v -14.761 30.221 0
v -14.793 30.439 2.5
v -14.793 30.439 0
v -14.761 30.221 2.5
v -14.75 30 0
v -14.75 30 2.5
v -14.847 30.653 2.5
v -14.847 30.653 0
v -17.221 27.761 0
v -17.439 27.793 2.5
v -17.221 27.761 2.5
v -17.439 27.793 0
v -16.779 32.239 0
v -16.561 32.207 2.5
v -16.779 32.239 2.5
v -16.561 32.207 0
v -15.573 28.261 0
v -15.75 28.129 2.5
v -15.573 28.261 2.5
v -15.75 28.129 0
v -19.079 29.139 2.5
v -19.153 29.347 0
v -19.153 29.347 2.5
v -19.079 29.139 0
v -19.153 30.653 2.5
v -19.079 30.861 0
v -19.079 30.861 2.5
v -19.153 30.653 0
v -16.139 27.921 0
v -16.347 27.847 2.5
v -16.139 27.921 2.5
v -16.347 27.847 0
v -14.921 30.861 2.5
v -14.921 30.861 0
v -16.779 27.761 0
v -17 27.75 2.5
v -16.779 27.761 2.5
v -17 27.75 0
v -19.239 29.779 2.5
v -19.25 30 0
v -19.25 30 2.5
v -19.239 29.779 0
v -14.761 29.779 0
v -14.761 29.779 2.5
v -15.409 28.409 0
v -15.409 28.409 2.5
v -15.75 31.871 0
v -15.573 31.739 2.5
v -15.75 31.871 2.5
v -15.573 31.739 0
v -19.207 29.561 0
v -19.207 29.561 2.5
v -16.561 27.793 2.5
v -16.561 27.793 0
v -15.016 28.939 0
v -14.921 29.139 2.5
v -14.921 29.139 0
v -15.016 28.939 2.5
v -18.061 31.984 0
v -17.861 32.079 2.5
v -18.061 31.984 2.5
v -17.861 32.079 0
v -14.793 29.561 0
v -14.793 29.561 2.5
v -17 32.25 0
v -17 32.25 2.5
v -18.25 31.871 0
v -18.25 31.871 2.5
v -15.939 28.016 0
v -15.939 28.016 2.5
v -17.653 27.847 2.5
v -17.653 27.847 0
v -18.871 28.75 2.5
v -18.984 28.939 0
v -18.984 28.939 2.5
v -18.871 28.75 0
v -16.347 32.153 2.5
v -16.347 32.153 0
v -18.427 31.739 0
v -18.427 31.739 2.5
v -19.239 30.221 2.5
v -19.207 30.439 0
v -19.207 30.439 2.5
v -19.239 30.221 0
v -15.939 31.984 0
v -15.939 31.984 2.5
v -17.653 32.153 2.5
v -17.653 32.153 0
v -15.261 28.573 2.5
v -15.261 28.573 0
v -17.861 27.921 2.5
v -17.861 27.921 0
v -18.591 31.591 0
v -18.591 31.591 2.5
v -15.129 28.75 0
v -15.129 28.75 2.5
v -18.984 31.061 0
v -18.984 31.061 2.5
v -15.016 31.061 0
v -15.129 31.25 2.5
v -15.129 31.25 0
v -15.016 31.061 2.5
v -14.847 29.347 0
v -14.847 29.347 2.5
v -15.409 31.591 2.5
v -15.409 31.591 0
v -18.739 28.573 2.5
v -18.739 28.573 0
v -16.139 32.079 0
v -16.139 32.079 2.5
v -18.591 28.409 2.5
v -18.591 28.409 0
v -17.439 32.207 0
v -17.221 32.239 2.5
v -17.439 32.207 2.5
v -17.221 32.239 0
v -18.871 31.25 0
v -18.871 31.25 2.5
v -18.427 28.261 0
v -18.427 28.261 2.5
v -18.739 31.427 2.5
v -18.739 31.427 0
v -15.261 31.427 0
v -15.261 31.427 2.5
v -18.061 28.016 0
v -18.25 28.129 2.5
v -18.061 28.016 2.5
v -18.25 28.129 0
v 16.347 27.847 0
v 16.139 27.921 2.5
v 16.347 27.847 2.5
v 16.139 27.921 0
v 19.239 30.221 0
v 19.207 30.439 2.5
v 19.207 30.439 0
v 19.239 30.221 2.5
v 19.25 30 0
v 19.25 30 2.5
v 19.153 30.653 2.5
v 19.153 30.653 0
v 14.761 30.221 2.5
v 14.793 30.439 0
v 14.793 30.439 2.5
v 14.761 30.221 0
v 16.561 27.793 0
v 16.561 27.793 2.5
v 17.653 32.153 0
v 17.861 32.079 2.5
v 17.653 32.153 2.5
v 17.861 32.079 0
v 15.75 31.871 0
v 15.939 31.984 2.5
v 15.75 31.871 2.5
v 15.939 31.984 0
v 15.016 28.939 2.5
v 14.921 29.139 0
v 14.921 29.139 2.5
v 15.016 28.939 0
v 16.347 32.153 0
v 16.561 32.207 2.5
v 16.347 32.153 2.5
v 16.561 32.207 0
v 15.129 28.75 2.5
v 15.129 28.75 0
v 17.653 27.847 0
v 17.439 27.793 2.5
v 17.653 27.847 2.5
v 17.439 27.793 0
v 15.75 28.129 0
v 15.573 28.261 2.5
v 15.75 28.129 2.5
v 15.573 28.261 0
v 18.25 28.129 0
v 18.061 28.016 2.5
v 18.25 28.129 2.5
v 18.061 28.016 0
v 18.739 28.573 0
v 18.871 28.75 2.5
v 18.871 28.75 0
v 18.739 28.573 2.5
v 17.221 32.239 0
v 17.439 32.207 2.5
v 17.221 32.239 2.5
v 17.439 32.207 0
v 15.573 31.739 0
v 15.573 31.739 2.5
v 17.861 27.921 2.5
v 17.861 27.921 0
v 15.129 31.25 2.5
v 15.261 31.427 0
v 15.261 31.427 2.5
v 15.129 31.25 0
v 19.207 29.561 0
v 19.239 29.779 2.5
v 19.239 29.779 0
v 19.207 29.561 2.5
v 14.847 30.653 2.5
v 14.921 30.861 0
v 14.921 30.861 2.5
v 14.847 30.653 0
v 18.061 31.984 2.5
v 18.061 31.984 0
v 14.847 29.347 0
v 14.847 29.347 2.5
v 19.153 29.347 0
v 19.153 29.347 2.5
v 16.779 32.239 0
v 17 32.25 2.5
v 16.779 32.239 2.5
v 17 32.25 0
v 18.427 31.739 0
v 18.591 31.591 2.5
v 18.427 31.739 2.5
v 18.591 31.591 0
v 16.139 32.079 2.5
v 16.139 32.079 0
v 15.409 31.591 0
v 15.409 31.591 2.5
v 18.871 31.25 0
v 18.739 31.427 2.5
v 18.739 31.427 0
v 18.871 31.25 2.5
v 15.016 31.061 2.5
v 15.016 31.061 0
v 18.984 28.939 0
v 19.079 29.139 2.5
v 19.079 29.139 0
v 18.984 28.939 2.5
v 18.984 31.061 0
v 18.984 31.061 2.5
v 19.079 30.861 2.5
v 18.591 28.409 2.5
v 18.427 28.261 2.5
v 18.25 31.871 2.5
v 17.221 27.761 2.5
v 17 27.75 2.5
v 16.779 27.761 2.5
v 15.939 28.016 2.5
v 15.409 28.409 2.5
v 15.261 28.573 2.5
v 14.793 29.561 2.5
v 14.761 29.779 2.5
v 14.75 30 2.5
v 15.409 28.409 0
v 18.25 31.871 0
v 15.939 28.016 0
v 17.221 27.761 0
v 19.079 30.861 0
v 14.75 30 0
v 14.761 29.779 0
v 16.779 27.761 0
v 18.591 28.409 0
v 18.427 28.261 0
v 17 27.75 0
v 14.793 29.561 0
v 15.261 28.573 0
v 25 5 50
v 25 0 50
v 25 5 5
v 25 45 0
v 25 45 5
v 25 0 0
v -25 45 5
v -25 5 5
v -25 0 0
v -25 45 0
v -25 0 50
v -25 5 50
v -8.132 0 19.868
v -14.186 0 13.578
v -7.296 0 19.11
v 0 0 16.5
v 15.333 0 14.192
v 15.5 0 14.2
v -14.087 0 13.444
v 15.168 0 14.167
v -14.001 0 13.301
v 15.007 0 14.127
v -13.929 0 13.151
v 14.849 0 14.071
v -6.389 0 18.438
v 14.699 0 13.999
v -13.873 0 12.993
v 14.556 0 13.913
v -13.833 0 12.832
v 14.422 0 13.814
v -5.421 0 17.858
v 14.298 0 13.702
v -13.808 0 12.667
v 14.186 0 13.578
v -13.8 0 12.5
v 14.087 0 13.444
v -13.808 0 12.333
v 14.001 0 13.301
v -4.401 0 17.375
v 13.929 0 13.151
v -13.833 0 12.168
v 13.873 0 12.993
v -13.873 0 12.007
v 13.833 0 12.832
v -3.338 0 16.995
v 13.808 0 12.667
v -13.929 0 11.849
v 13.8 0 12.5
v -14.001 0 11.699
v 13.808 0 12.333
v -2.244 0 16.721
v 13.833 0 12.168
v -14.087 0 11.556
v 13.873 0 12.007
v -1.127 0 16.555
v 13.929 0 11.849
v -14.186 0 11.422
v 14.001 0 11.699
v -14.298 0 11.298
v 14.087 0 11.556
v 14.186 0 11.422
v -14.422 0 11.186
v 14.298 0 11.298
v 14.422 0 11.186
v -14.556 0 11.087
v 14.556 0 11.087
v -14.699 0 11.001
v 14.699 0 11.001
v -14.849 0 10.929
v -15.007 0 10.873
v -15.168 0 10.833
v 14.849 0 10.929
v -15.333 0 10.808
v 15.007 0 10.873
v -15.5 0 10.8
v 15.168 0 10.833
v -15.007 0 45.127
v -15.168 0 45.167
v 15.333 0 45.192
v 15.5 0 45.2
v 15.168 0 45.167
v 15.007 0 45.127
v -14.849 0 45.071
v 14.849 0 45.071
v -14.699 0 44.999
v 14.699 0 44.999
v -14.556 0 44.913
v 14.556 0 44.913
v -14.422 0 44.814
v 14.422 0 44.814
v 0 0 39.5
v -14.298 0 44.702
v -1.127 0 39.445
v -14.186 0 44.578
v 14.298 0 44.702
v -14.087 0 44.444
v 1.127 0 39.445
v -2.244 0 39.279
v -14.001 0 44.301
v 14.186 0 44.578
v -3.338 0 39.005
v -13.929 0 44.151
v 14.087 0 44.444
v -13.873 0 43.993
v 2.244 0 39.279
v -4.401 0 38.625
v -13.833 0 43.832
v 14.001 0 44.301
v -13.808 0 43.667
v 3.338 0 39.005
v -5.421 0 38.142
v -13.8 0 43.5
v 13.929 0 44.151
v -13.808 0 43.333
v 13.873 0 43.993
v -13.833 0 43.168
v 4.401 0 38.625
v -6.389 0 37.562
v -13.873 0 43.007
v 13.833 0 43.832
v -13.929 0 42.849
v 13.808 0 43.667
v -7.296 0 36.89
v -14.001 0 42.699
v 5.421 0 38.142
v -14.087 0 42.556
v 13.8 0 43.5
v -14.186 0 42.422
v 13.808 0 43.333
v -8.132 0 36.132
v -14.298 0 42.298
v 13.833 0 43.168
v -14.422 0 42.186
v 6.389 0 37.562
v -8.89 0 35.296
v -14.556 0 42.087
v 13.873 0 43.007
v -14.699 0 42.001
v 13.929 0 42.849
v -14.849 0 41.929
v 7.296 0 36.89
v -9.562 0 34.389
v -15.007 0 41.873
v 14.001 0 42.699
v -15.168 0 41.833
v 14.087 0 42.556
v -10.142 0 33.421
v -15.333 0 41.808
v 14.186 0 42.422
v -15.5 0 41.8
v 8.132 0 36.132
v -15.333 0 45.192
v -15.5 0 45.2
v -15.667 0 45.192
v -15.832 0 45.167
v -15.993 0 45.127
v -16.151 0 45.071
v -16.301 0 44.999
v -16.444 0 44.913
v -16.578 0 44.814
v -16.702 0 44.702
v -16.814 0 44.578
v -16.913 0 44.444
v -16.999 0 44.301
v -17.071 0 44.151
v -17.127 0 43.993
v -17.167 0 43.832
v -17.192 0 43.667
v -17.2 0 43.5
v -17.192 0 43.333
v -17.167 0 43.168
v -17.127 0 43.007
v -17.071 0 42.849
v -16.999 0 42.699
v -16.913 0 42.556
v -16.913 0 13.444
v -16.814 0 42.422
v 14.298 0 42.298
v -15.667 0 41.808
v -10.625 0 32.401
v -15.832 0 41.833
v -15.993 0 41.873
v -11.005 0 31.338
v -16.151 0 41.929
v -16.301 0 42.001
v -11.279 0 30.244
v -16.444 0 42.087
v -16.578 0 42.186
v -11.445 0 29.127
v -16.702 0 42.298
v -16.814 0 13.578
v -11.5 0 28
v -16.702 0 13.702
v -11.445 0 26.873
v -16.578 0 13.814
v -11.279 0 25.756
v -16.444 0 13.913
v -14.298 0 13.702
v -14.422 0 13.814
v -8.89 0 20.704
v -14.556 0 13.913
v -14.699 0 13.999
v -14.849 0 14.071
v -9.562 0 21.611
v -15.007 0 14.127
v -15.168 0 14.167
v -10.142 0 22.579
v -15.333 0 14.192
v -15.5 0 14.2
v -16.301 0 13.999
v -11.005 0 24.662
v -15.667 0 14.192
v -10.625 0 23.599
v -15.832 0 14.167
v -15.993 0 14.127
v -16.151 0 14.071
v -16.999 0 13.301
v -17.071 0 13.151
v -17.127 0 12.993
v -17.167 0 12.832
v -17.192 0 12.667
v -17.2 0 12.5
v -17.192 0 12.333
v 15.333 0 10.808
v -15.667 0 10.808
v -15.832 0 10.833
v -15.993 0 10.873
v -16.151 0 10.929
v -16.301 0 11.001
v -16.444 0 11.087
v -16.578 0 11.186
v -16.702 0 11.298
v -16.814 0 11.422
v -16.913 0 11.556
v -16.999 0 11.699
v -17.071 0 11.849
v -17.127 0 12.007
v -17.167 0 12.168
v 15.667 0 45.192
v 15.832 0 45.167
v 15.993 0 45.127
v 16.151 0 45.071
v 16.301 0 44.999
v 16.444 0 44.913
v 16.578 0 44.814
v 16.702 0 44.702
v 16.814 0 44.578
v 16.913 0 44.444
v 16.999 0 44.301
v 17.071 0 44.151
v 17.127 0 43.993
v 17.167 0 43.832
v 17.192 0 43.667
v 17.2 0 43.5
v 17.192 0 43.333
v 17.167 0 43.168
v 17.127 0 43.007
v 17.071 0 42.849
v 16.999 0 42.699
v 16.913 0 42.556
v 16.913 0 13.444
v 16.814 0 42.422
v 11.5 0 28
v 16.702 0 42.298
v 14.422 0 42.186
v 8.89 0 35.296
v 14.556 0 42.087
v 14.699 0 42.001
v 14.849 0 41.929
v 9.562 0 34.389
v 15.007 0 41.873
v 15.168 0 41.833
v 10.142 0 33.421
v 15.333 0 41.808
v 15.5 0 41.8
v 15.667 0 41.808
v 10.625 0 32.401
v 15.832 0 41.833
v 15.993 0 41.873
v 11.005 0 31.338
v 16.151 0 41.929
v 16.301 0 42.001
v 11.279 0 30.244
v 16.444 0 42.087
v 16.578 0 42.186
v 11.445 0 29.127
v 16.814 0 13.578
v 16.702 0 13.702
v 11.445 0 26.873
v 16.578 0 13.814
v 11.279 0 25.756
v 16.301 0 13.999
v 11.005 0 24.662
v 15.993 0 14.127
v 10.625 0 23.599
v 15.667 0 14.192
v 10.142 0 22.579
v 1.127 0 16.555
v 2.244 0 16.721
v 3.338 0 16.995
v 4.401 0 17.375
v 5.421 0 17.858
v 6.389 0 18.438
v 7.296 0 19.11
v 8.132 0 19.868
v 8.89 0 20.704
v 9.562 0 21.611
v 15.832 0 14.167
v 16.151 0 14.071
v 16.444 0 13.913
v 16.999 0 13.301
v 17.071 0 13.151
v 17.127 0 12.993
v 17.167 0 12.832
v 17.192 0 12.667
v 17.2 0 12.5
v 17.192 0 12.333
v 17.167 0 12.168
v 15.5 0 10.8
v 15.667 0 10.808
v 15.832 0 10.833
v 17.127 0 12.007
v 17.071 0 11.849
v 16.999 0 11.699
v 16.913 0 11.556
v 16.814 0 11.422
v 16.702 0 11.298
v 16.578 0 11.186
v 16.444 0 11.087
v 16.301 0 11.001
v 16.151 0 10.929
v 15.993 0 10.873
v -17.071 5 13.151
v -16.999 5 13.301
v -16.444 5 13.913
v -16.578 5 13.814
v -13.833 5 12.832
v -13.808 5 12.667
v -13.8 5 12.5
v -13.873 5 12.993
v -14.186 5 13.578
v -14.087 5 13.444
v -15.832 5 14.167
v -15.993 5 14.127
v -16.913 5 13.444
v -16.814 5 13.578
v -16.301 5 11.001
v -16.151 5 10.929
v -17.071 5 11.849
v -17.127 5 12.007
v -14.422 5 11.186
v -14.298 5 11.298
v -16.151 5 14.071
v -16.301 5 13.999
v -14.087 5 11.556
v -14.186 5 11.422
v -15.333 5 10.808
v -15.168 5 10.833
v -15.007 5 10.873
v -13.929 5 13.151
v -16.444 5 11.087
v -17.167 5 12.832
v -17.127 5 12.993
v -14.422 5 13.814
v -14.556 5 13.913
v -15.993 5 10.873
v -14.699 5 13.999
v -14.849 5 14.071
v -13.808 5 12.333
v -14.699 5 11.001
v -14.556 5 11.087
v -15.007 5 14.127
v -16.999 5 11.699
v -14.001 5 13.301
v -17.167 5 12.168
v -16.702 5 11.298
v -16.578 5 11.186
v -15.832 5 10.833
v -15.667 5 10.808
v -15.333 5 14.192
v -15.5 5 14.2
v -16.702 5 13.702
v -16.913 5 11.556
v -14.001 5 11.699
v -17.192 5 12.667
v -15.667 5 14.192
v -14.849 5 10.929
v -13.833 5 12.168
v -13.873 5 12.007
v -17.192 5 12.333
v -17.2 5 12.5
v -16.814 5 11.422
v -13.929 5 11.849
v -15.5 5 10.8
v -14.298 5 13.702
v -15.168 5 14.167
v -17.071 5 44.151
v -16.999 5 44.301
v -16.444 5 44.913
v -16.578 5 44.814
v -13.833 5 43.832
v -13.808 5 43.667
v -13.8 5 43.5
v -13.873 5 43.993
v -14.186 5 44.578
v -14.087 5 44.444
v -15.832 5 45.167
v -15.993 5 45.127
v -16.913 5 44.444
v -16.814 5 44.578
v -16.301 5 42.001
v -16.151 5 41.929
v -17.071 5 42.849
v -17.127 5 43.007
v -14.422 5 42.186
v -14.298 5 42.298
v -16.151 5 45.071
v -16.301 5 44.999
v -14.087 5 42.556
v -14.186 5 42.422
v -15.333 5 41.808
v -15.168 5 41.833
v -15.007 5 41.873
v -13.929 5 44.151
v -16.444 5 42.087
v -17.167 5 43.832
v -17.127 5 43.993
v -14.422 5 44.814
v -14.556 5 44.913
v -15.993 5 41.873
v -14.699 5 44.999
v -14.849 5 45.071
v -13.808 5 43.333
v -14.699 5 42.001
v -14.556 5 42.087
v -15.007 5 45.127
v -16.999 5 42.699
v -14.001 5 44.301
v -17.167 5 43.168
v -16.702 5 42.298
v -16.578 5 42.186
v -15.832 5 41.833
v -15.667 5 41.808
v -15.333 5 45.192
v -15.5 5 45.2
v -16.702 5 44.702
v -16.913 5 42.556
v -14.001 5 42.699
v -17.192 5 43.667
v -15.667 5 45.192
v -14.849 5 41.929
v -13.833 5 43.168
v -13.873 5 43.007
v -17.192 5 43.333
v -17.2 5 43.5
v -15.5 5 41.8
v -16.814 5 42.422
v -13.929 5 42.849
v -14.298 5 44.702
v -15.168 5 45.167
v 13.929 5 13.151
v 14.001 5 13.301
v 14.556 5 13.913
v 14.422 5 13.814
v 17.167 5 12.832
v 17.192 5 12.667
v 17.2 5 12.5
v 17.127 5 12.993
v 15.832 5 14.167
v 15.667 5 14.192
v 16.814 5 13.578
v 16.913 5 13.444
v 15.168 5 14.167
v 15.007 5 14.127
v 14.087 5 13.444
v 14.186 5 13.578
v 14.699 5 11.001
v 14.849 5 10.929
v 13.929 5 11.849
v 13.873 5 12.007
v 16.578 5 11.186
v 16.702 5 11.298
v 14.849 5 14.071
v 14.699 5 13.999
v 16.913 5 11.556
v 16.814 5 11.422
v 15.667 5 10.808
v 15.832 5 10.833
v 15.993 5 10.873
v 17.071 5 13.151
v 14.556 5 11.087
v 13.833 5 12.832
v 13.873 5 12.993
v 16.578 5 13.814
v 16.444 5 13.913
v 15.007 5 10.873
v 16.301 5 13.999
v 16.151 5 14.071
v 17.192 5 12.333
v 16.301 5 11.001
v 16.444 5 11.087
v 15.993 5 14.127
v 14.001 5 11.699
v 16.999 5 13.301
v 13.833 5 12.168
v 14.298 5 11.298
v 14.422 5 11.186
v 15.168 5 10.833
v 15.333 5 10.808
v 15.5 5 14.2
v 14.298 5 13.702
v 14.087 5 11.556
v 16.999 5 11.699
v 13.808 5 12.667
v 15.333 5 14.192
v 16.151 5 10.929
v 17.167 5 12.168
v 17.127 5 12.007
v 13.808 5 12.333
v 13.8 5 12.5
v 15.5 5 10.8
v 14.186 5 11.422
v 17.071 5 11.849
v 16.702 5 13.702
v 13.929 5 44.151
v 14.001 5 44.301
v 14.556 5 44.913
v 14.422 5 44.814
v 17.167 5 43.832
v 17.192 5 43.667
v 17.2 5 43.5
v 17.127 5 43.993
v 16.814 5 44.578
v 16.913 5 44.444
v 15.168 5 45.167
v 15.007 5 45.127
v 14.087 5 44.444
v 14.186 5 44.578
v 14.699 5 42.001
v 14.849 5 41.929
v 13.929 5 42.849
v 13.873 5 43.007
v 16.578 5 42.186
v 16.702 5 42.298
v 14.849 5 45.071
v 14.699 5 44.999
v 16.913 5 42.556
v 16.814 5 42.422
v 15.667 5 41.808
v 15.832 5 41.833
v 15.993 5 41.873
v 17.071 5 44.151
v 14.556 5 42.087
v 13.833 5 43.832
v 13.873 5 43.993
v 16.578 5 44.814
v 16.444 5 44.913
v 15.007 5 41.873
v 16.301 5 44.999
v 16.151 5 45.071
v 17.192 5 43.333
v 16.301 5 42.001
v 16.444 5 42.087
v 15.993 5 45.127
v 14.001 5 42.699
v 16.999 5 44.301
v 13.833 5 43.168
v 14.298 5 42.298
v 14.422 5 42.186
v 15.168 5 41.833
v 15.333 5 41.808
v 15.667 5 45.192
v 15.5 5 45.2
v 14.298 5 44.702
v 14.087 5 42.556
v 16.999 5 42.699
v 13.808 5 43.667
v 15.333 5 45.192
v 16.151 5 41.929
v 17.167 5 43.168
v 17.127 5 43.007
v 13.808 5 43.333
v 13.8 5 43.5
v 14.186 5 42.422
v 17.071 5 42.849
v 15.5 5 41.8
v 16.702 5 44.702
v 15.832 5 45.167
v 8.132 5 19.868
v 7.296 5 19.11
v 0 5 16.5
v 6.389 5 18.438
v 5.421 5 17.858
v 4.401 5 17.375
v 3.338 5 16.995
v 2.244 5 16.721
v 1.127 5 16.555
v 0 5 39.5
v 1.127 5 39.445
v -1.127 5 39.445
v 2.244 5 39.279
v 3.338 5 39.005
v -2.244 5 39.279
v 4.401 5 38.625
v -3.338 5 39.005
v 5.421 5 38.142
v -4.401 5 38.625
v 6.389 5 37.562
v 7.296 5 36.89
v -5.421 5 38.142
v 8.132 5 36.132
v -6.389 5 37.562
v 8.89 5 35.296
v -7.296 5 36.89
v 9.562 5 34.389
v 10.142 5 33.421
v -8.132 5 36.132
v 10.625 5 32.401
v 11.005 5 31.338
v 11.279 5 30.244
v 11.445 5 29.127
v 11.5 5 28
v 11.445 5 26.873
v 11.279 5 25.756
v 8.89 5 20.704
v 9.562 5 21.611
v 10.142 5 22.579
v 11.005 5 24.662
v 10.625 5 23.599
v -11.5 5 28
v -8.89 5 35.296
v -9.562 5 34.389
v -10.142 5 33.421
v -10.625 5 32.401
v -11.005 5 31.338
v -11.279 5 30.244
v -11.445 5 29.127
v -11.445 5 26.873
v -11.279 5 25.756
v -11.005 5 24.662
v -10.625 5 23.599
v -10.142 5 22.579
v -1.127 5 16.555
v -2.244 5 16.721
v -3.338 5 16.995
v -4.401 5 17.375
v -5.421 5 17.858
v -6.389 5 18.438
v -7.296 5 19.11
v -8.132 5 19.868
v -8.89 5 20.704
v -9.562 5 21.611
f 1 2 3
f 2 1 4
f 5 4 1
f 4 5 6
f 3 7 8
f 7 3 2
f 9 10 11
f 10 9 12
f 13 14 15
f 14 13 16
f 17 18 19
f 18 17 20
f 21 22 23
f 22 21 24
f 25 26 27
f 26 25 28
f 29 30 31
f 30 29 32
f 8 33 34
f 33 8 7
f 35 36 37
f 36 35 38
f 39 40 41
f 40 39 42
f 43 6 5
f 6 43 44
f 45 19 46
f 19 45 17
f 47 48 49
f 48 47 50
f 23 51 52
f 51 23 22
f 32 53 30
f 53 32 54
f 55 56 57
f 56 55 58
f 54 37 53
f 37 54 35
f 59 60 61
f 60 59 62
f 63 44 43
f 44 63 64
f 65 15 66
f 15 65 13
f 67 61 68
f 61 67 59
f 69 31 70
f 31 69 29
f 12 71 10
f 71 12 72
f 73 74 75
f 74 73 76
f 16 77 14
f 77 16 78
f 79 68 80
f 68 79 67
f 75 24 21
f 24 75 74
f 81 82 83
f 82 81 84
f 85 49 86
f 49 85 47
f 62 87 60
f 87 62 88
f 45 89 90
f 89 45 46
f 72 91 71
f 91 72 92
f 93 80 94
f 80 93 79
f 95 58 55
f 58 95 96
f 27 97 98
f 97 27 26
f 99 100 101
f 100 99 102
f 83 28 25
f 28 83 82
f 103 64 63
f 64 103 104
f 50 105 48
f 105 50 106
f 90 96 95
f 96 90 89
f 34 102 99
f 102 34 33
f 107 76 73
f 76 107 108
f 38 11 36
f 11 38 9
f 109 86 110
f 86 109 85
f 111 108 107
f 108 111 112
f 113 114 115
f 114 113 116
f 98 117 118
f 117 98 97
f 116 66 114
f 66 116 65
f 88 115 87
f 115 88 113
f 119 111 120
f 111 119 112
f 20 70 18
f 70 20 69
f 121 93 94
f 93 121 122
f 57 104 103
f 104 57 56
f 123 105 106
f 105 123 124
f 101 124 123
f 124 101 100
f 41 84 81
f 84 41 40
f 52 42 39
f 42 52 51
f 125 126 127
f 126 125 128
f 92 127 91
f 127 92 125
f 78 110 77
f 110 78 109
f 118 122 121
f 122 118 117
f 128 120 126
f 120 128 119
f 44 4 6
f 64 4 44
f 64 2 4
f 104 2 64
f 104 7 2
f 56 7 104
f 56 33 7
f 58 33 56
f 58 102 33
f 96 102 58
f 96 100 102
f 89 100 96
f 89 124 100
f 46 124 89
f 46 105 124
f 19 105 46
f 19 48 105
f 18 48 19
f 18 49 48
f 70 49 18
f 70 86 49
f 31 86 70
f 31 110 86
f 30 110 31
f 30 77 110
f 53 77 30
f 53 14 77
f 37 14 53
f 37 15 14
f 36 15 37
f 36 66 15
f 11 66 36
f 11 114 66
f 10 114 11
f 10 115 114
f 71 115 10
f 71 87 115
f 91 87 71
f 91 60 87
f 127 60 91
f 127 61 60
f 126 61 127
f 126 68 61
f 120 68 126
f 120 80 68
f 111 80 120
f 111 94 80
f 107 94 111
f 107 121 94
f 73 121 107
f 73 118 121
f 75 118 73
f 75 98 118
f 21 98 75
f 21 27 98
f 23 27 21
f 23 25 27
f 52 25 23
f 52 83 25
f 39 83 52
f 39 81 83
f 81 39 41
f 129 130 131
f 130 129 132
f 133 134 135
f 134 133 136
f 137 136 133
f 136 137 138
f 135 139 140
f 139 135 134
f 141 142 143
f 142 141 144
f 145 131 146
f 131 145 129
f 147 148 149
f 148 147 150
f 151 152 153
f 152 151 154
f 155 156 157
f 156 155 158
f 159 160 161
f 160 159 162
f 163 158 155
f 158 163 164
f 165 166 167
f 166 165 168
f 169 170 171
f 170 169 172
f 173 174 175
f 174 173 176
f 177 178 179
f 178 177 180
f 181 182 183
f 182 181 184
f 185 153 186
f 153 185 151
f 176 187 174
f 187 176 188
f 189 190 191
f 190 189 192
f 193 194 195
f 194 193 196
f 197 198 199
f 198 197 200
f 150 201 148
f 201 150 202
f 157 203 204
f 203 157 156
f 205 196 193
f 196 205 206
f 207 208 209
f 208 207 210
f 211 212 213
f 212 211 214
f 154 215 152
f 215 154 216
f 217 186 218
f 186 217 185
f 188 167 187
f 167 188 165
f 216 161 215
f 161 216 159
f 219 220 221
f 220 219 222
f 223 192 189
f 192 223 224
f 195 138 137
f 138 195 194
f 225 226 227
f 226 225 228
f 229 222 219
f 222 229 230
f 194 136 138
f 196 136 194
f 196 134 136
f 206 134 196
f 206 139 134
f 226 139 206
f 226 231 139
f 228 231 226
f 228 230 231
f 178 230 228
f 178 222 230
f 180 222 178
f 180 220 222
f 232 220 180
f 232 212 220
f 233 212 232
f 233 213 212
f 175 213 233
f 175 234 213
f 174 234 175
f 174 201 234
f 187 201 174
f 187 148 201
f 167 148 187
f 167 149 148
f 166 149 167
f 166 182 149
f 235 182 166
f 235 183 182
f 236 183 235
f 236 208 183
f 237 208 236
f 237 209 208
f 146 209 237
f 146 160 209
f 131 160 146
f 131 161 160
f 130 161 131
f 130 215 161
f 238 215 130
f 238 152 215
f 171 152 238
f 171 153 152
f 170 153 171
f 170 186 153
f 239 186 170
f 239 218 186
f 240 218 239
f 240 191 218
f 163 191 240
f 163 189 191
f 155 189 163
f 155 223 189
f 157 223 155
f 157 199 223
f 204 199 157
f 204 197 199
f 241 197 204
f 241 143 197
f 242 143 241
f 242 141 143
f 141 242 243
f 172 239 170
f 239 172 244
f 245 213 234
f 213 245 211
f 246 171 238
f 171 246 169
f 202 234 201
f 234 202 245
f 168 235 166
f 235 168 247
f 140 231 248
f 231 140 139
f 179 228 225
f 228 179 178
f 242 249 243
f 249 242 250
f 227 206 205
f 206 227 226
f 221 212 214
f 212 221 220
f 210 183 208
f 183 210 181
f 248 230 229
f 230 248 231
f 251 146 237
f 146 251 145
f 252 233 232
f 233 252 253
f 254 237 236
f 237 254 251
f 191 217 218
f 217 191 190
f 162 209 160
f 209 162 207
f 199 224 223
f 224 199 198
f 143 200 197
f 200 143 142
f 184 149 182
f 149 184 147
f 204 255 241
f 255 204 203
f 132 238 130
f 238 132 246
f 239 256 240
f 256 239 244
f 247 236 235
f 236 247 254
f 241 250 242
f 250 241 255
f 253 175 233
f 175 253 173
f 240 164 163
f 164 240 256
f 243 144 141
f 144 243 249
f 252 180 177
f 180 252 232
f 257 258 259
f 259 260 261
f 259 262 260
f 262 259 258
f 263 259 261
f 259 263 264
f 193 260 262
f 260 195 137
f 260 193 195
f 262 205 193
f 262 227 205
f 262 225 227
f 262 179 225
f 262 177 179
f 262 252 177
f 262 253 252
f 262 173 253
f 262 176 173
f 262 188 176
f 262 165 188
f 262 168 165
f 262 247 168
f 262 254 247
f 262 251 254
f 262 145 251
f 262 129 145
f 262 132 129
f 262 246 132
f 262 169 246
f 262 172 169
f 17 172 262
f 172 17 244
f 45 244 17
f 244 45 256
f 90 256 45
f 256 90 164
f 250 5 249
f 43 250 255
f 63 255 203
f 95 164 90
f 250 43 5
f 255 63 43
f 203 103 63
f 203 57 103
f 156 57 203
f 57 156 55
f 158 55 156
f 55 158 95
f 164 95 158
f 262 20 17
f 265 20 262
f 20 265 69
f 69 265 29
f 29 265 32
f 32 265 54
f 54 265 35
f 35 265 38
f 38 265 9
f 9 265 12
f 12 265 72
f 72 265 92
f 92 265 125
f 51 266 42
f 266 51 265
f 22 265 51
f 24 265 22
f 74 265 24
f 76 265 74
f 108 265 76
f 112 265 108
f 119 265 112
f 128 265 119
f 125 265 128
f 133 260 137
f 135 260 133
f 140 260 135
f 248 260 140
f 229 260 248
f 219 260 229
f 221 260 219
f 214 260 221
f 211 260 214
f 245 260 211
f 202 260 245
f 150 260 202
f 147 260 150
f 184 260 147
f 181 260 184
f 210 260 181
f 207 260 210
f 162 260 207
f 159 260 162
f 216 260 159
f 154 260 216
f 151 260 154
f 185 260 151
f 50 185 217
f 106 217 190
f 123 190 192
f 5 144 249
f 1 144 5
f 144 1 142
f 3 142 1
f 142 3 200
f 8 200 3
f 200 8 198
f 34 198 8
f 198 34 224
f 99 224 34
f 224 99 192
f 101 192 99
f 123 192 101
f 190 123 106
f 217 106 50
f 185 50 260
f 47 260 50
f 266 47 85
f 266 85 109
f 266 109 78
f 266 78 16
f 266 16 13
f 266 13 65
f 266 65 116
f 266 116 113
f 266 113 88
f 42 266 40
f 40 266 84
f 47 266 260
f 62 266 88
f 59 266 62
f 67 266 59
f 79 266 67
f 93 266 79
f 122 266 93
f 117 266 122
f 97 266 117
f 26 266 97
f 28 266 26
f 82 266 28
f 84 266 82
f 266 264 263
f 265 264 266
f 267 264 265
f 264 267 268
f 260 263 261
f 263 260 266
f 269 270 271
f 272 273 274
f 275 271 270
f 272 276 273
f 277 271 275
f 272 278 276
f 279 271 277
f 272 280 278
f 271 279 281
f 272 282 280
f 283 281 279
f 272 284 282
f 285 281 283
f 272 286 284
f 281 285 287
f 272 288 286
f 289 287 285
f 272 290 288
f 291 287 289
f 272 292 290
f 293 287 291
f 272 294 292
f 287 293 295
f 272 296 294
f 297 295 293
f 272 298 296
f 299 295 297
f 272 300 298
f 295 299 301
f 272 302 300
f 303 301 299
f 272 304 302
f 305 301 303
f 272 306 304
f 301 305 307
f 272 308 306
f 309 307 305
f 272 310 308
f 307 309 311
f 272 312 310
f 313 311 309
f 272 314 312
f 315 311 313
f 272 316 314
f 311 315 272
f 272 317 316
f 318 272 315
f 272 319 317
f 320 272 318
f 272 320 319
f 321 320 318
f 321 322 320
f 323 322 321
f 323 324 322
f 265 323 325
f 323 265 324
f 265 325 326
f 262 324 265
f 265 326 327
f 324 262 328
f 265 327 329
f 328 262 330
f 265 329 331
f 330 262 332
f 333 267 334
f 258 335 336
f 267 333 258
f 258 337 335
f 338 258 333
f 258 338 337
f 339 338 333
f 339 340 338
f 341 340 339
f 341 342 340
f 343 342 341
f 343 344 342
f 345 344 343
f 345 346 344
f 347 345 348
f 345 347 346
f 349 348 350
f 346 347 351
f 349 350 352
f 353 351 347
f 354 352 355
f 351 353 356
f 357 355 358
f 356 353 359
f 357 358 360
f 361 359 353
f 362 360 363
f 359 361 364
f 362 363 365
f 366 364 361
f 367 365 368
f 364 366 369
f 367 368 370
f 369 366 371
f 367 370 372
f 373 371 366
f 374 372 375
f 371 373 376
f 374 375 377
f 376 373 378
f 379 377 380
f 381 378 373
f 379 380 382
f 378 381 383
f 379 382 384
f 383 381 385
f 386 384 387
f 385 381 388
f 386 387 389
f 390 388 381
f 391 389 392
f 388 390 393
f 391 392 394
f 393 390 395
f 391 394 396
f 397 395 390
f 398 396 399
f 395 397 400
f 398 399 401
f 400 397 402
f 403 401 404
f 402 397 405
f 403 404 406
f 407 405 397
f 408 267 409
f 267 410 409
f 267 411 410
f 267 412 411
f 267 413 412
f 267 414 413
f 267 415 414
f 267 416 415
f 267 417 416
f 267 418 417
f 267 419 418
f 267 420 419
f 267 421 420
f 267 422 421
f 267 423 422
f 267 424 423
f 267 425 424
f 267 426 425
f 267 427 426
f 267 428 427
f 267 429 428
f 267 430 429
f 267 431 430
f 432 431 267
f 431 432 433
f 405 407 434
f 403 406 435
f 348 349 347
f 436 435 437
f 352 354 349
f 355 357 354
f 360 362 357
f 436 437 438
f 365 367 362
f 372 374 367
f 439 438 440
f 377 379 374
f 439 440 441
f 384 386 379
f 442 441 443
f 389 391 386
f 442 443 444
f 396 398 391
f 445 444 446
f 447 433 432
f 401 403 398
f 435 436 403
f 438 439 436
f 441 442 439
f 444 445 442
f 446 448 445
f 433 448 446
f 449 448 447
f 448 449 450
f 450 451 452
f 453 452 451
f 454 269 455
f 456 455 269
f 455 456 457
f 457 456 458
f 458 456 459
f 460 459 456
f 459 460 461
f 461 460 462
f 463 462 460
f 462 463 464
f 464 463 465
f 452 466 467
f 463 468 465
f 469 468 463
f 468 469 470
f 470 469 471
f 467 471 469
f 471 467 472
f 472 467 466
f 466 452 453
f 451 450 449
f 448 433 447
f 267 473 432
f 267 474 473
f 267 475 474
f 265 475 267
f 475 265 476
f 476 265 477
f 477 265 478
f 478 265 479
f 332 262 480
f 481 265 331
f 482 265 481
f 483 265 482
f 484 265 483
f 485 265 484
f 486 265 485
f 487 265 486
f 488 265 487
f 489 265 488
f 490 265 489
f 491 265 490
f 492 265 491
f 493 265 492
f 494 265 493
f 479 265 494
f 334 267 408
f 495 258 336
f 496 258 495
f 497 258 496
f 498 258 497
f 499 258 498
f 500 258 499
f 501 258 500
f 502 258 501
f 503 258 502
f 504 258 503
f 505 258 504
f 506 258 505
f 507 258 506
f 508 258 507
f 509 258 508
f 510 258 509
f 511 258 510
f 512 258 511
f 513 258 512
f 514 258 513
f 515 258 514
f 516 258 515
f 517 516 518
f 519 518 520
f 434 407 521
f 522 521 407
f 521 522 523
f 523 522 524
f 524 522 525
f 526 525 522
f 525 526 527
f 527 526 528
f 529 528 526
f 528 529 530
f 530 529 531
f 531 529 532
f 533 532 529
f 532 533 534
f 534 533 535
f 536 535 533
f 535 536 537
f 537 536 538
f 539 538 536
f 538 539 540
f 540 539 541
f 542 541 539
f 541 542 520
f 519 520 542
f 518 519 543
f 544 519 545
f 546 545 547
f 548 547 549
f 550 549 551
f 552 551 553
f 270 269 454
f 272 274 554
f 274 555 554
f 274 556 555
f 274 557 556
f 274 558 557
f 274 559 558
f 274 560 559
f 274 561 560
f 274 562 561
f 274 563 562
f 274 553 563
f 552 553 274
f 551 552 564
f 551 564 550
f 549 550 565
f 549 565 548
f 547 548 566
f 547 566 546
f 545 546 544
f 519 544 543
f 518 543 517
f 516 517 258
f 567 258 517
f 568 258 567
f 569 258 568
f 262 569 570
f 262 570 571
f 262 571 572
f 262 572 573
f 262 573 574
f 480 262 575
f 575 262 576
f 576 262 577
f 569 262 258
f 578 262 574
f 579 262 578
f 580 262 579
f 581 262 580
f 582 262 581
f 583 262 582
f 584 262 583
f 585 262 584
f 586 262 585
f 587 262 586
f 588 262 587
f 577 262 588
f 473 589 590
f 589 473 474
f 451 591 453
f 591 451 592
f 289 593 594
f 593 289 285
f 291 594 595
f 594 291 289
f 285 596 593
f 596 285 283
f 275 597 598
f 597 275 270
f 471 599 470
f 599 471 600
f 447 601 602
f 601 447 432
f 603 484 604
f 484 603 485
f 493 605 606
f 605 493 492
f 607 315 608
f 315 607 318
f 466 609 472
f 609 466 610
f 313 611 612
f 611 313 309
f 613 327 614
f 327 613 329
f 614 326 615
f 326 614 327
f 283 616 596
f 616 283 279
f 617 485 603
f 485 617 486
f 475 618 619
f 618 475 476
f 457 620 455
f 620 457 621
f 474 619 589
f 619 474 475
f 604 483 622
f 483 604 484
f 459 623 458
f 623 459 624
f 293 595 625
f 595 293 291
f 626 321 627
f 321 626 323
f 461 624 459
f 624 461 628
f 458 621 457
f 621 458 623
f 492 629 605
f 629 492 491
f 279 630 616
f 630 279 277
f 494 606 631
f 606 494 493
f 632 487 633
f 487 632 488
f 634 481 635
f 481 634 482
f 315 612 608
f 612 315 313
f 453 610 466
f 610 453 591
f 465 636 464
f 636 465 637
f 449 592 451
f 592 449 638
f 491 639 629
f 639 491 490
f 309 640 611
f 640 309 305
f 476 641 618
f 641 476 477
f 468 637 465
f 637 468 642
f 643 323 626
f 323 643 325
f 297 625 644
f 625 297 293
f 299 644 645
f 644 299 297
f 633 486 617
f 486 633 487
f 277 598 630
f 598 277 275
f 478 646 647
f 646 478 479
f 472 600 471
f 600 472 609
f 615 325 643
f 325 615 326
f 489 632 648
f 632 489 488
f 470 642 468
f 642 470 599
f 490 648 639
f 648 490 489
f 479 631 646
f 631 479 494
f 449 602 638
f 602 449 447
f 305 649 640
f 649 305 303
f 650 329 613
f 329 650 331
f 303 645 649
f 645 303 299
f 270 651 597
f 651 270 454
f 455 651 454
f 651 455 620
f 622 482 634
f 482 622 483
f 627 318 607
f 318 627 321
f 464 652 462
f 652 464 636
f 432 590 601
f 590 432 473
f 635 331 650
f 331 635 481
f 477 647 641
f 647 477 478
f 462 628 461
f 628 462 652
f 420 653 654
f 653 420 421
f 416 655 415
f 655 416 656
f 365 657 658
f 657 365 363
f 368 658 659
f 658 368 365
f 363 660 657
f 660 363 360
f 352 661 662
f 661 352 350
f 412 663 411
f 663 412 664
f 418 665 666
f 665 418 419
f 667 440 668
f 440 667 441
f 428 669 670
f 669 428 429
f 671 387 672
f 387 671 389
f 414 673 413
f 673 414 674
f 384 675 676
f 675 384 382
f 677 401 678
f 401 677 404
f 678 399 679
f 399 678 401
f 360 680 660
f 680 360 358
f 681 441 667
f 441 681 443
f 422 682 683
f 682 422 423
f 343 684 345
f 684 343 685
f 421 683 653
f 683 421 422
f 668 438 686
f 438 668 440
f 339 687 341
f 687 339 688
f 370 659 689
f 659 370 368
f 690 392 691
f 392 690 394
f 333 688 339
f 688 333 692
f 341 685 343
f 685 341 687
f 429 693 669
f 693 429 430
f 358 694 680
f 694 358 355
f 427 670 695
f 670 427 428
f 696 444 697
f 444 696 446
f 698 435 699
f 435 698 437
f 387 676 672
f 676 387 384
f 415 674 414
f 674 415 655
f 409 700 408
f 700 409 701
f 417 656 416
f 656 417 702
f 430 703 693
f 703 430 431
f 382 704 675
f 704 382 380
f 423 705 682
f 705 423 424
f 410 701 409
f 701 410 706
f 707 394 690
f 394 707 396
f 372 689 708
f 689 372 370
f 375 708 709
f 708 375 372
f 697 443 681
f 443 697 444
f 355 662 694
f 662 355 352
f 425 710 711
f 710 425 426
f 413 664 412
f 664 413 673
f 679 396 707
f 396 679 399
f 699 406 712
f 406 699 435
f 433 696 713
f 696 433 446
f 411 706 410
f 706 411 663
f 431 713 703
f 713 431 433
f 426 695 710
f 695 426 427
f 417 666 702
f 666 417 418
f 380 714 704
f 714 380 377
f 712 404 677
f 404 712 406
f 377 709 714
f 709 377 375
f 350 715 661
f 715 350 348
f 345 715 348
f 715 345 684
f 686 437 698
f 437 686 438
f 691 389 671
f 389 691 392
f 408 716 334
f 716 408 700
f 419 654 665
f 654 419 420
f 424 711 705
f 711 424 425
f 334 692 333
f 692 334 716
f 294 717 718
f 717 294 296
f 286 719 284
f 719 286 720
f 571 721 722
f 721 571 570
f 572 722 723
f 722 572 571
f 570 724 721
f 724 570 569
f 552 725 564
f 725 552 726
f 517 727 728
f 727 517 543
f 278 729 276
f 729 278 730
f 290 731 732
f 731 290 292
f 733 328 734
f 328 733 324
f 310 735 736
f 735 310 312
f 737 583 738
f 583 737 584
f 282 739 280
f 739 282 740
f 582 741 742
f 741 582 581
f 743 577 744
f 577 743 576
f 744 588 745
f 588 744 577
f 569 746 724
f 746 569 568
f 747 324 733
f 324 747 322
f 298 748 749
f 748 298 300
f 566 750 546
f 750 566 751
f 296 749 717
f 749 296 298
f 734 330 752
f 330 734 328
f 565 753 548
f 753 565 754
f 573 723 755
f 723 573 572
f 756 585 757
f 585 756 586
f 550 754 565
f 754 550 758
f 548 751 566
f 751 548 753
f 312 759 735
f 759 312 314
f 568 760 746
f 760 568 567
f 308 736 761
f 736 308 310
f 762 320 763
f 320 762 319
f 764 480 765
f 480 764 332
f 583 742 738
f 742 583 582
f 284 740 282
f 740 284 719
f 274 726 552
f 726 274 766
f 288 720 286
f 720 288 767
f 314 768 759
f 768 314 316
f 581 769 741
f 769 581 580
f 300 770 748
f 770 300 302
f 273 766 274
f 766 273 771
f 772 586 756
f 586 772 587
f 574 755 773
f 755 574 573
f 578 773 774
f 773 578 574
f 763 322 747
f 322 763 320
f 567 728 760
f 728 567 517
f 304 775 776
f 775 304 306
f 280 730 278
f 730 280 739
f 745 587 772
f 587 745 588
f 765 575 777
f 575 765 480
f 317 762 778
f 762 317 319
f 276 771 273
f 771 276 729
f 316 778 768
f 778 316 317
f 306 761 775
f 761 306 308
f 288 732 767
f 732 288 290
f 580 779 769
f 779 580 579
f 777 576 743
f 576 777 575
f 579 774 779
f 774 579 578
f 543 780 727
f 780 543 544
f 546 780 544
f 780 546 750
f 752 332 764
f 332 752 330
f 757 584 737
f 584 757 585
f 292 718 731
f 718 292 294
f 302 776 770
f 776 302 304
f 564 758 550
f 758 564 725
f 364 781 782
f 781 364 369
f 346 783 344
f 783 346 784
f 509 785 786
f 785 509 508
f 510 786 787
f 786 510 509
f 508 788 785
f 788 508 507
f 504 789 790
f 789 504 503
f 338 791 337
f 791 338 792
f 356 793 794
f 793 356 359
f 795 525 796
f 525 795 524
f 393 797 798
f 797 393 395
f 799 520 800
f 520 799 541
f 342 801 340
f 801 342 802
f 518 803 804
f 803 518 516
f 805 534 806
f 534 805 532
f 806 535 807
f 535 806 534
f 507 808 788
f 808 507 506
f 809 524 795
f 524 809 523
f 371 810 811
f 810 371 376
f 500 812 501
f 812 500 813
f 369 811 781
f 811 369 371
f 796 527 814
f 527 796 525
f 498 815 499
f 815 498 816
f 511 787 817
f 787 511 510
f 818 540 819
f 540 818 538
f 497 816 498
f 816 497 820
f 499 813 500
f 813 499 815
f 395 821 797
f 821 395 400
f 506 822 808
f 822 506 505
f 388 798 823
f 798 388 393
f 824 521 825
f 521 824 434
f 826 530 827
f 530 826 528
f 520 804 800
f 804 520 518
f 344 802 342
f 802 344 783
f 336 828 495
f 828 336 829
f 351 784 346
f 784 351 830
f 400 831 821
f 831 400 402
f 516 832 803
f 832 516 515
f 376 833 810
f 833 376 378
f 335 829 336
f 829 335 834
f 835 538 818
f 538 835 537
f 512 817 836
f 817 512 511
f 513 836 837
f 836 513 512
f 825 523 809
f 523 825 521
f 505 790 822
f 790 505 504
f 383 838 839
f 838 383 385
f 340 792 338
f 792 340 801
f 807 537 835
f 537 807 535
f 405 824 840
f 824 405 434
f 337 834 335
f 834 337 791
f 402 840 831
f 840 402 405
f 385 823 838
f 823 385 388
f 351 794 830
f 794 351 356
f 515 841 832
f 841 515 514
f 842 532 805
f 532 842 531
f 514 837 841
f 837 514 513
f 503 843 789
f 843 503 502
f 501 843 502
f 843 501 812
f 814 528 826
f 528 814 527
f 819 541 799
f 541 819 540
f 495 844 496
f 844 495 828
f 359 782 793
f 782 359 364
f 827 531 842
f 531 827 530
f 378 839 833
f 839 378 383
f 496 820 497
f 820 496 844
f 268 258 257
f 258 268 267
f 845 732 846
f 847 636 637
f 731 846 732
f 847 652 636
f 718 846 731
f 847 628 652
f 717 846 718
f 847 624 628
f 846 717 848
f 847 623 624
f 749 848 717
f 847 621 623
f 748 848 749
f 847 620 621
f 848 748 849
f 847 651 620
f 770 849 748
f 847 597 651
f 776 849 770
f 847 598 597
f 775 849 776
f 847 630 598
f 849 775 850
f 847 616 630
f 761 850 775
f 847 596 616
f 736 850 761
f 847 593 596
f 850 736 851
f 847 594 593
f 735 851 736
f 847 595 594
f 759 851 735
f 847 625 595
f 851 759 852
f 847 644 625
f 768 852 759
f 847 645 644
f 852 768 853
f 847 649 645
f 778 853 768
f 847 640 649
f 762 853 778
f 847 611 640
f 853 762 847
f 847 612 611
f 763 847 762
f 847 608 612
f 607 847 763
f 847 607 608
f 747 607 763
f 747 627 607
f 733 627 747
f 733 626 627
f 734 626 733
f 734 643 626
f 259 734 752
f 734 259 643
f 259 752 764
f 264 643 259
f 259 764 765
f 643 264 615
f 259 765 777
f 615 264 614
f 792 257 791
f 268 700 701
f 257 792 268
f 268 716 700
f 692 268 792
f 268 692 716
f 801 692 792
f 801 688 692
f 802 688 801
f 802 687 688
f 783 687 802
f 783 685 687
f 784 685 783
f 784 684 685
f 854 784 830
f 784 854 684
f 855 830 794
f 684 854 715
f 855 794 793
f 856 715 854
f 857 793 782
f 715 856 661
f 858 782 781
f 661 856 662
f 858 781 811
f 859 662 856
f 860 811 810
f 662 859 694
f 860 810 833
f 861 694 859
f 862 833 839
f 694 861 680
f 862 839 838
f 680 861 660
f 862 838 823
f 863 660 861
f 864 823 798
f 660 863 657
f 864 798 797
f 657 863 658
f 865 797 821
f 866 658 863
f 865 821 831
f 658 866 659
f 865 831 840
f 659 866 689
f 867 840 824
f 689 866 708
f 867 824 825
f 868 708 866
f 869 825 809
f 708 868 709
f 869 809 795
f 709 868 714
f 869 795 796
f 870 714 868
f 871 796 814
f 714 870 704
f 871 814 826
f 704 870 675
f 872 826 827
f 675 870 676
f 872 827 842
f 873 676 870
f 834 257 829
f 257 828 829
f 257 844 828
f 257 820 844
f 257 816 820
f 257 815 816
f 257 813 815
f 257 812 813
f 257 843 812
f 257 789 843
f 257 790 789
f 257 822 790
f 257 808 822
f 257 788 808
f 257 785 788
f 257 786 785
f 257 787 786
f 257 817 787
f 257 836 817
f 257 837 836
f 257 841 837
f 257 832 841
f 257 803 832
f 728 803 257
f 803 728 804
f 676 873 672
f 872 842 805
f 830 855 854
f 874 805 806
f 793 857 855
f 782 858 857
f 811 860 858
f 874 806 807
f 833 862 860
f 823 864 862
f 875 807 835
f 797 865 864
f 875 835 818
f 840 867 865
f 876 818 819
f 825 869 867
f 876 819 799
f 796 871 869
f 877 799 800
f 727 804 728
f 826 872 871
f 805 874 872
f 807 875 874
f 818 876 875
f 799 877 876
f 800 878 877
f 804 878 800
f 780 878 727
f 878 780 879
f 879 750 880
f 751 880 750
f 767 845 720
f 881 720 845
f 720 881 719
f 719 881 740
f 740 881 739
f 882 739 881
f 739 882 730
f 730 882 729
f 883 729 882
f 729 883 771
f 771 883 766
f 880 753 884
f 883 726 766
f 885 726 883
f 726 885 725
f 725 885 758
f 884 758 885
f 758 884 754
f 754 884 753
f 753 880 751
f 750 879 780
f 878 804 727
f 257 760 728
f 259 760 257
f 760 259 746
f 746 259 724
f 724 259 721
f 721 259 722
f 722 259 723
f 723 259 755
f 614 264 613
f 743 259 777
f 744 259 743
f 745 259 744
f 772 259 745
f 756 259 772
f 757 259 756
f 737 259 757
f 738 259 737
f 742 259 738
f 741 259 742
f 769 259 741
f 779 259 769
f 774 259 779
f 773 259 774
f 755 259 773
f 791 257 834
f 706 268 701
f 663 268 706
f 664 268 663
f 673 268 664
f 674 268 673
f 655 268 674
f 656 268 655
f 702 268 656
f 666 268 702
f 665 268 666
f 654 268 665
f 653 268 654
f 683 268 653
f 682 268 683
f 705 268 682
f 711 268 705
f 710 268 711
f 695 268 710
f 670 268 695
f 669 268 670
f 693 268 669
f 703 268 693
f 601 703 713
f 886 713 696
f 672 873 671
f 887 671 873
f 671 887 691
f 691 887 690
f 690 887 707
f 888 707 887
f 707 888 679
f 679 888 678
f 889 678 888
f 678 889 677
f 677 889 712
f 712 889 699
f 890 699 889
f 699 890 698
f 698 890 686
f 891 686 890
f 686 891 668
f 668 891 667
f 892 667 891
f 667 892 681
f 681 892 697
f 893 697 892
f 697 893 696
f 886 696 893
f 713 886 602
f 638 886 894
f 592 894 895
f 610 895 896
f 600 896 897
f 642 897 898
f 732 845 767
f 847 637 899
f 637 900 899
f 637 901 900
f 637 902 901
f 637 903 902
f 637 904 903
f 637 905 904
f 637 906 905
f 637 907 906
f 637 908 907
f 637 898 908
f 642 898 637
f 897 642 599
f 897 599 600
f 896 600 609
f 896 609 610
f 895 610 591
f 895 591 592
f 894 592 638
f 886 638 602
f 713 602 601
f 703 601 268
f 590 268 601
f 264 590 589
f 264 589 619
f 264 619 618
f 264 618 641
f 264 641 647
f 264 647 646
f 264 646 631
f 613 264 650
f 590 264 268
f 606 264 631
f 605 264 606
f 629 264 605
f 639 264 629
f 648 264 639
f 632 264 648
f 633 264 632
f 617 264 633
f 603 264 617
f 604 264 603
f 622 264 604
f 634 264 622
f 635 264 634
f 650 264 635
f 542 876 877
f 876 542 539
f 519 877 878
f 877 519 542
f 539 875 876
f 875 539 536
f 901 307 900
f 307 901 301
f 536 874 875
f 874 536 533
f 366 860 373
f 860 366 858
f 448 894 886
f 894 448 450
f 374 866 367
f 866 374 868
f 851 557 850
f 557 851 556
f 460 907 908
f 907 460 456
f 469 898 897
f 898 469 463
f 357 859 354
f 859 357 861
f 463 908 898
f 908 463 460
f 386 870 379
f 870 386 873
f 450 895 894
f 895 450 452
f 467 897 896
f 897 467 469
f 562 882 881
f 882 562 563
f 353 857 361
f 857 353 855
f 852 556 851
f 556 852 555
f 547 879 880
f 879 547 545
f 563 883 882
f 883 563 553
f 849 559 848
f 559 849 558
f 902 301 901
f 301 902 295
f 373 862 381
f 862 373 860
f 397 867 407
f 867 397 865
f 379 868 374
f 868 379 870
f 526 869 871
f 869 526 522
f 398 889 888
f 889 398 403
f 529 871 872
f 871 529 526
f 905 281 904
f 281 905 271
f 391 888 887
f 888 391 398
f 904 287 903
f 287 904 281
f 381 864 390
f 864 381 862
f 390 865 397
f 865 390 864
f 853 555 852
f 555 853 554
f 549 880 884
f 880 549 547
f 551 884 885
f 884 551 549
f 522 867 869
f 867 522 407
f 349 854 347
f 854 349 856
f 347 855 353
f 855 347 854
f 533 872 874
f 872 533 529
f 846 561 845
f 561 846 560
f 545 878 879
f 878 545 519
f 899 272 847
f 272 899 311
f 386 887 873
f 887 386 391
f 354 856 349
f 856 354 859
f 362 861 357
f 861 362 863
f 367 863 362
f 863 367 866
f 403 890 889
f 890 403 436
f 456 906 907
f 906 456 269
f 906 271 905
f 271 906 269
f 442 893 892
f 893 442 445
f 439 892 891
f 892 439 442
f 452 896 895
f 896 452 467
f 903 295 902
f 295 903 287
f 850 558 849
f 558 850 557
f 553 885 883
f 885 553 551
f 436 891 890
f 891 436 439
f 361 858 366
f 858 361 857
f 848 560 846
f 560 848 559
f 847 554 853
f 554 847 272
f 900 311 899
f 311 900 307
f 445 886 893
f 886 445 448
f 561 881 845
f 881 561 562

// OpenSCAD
//--------------------
// Parameters
//--------------------
base_x = 50;               // total width of base plate (x: -25 to 25)
base_y = 45;               // length of base plate (y: 0 to 45)
base_z = 5;                // thickness of base plate (z: 0 to 5)

m4_dia = 4.5;             // M4 hole diameter
m4_radius = m4_dia/2;
m4_hole_extend = 0.2;     // extra length beyond faces for clean cut

motor_y = 5;               // thickness of motor plate in Y direction
motor_z = 50;              // height of motor plate in Z direction

boss_dia = 23;             // motor centring boss hole diameter
boss_radius = boss_dia/2;
boss_hole_extend = 0.2;    // extra length beyond faces

m3_dia = 3.4;              // M3 screw hole diameter
m3_radius = m3_dia/2;
m3_hole_extend = 0.2;     // extra length beyond faces

gusset_thick = 5;          // thickness of gussets (in X)
gusset_leg = 20;           // leg length of right‑triangle in Y and Z
gusset_extend = 0.2;       // extra length beyond faces for clean cut

//--------------------
// Geometry
//--------------------
$fn = 64;

// Base plate with M4 holes
module base_plate() {
    difference() {
        // solid block
        translate([-base_x/2, 0, 0])
            cube([base_x, base_y, base_z], center = false);
        // M4 holes (vertical, through Z)
        for (pos = [[-17, 30], [17, 30]]) {
            translate([pos[0], pos[1], -m4_hole_extend])
                cylinder(r = m4_radius, h = base_z + 2*m4_hole_extend, center = true);
        }
    }
}

// Motor plate with boss hole and M3 screw holes (cut along Y)
module motor_plate() {
    difference() {
        // solid block
        translate([-base_x/2, 0, 0])
            cube([base_x, motor_y, motor_z], center = false);
        // Boss hole (cylinder along Y)
        translate([0, motor_y/2, 28])
            rotate([90,0,0])               // align cylinder with Y axis
                cylinder(r = boss_radius,
                         h = motor_y + 2*boss_hole_extend,
                         center = true);
        // Four M3 holes (cylinder along Y)
        for (dx = [-15.5, 15.5])
            for (dz = [12.5, 43.5])
                translate([dx, motor_y/2, dz])
                    rotate([90,0,0])
                        cylinder(r = m3_radius,
                                 h = motor_y + 2*m3_hole_extend,
                                 center = true);
    }
}

// Single triangular gusset (right‑triangle in YZ, extruded in X)
module triangular_gusset() {
    // 2‑D triangle in YZ plane (right‑angle at (5,5))
    polygon(points = [[5,5],
                      [5+gusset_leg,5],
                      [5,5+gusset_leg]]);
    // Rotate to make the extrusion direction become X
    rotate([0,90,0])
        linear_extrude(height = gusset_thick + gusset_extend, center = false);
    // Rotate back to original orientation
    rotate([0,-90,0]);
}

// Left gusset (flush with x = -25 edge)
module left_gusset() {
    translate([-20,0,0])   // shift so that X runs from -25 to -20
        triangular_gusset();
}

// Right gusset (flush with x = 25 edge)
module right_gusset() {
    translate([20,0,0])    // shift so that X runs from 20 to 25
        mirror([1,0,0])    // mirror the left gusset geometry
            left_gusset();
}

//--------------------
// Assembly
//--------------------
union() {
    base_plate();
    motor_plate();
    left_gusset();
    right_gusset();
}
